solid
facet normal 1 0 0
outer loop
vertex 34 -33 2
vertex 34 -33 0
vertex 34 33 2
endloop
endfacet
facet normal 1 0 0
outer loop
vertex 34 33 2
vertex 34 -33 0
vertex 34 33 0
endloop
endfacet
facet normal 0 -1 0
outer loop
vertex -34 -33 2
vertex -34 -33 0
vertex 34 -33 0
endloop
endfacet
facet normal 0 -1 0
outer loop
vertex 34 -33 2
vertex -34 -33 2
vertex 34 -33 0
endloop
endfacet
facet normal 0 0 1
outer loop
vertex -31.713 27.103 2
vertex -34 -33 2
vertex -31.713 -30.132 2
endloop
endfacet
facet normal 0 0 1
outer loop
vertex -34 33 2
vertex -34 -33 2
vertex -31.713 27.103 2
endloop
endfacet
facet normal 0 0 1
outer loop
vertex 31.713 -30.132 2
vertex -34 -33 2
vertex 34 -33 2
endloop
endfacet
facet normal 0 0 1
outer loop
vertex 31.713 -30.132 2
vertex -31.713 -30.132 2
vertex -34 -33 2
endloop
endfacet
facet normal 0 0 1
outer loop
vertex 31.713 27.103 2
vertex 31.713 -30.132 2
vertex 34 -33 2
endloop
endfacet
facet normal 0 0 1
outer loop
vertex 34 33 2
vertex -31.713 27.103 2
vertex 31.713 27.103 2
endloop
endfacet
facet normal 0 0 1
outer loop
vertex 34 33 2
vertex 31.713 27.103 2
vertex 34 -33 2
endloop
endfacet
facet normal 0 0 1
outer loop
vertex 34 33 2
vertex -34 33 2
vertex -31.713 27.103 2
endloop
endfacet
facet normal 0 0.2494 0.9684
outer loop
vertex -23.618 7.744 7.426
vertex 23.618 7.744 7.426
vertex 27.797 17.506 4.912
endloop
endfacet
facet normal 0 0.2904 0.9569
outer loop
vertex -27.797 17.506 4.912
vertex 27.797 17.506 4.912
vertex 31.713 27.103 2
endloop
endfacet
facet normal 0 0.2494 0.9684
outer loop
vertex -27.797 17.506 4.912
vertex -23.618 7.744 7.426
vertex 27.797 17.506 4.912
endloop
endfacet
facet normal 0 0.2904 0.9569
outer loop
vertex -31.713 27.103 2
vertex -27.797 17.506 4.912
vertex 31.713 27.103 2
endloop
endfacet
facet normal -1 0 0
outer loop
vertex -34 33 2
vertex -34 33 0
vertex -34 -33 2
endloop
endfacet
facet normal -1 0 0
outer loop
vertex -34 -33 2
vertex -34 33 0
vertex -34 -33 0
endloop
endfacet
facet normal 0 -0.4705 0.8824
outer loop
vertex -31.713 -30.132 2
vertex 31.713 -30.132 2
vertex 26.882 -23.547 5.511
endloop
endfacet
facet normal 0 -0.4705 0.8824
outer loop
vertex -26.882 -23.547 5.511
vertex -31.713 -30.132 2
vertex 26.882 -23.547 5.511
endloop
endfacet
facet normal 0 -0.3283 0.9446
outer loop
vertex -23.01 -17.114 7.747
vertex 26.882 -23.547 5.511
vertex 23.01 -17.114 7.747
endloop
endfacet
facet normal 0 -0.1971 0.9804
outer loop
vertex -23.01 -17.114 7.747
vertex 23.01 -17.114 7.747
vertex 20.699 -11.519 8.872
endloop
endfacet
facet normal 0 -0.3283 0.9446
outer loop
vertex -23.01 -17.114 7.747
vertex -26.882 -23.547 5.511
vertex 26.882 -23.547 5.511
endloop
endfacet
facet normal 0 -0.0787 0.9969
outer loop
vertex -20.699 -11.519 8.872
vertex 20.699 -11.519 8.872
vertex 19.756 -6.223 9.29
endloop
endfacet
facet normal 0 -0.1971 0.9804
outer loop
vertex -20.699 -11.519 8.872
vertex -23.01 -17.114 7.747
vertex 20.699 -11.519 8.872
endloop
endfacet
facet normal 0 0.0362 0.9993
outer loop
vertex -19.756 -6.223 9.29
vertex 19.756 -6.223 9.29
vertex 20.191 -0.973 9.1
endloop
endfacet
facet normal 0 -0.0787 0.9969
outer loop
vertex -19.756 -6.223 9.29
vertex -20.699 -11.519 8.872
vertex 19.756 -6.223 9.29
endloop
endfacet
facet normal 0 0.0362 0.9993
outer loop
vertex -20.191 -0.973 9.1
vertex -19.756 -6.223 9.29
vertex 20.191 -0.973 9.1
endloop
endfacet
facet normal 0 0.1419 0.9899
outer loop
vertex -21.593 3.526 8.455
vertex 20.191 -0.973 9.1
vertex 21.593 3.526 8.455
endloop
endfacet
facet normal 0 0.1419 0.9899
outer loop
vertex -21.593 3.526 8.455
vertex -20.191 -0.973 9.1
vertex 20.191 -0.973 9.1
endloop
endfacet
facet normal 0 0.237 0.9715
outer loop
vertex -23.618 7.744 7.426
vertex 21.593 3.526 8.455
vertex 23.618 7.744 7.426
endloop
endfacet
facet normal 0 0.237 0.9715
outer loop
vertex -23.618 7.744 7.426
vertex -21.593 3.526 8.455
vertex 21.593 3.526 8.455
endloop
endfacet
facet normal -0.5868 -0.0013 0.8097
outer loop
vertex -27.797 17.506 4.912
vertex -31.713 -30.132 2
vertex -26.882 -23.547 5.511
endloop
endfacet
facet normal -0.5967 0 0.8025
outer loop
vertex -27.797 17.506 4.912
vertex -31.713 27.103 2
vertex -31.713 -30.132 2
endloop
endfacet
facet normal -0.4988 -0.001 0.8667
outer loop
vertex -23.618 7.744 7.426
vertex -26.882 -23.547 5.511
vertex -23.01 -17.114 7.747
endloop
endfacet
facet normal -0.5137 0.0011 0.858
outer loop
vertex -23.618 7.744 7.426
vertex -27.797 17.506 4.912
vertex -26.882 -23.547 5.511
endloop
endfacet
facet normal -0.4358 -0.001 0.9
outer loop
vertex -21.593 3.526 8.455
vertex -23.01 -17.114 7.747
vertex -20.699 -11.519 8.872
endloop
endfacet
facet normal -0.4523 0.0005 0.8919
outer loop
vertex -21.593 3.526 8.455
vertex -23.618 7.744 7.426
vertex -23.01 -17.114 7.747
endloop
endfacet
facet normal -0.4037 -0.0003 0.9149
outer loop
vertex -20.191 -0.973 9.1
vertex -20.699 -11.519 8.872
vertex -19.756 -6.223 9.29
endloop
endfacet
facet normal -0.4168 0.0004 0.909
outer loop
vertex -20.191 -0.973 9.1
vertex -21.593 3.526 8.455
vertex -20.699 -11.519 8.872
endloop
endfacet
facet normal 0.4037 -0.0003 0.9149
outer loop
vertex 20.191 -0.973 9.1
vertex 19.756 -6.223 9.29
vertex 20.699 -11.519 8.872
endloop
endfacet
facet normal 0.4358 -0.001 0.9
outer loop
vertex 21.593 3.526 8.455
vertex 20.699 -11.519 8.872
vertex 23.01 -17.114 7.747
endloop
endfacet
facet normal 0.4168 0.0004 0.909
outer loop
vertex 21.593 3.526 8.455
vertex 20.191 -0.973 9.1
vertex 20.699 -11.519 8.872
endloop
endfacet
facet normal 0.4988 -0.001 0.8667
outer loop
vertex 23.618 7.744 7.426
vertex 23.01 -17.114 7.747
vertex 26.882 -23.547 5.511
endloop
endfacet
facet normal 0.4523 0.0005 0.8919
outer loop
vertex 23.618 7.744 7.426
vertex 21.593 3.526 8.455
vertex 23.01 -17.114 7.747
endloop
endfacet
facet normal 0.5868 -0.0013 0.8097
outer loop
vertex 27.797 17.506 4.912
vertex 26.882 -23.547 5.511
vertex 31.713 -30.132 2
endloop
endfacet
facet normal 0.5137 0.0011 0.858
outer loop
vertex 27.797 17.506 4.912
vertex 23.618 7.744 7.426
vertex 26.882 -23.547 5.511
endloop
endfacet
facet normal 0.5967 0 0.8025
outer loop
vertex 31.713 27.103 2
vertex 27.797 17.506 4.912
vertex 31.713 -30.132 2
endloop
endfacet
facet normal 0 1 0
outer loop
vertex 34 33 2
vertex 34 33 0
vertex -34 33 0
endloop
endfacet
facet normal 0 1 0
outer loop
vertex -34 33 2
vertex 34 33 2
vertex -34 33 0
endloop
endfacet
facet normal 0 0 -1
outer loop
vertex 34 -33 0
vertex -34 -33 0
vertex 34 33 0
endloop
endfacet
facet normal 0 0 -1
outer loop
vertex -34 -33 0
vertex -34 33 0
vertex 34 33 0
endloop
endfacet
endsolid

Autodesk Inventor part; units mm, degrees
ref_plane "YZ Plane" through (0, 0, 0) normal (1, 0, 0) x (0, 1, 0)
ref_plane "XZ Plane" through (0, 0, 0) normal (0, 1, 0) x (-1, 0, 0)
ref_plane "XY Plane" through (0, 0, 0) normal (0, 0, 1) x (1, 0, 0)
sketch "Sketch1" plane through (0, 0, 0) normal (0, 0, 1) x (1, 0, 0)
  line L0 (-34, -33) -> (34, -33)
  line L1 (34, -33) -> (34, 33)
  line L2 (34, 33) -> (-34, 33)
  line L3 (-34, 33) -> (-34, -33)
  line L4 (-34, -33) -> (34, 33) construction
  line L5 (34, -33) -> (-34, 33) construction
  point P0 (0, 0)
  dimension "d0" = 68
  dimension "d1" = 66
extrude "Extrusion1" add sketch "Sketch1" along normal blind 2
sketch "Sketch2" plane through (-34, -33, 0) normal (-1, 0, 0) x (0, 0, 1)
  line L0 (0, 0) -> (0, 66) construction
  line L1 (0, 66) -> (0, 0)
  line L2 (0, 65.9635) -> (0, 0)
  arc A0 (7.4259, 40.744) -> (0, 65.9635) centre (-222.7937, -13.3415) ccw
  arc A1 (0, 0) -> (7.4259, 40.744) centre (-36.728, 27.7427) ccw
  point P0 (0, 33)
extrude "Extrusion2" add sketch "Sketch2" against normal blind 68
sketch "Sketch3" plane through (-34, 33, 0) normal (0, 1, 0) x (1, 0, 0)
  line L0 (0, 0) -> (68, 0) projected
  line L1 (0, -10.0891) -> (68, -10.0891) projected
  line L2 (68, 0) -> (0, 0)
  line L3 (0, -2) -> (68, -2) projected
  line L4 (68, -2) -> (0, -2)
  line L5 (0, -2) -> (0, 0)
  line L6 (0, 0) -> (68, 0)
  line L7 (68, 0) -> (68, -2)
  arc A0 (0, 0) -> (68, 0) centre (34, 36.5643) ccw
  point P0 (34, 0)
  point P1 (51.788, -10.0891)
  point P2 (65.7135, -2)
  point P3 (2.2865, -2)
  point P4 (16.212, -10.0891)
extrude "Extrusion3" cut sketch "Sketch3" against normal blind 68 contours A0 L3 L5 | L0 A0 L3 | L7 L3 A0 | L3 A0 L1 keep common part
properties part number "Obudowa"
